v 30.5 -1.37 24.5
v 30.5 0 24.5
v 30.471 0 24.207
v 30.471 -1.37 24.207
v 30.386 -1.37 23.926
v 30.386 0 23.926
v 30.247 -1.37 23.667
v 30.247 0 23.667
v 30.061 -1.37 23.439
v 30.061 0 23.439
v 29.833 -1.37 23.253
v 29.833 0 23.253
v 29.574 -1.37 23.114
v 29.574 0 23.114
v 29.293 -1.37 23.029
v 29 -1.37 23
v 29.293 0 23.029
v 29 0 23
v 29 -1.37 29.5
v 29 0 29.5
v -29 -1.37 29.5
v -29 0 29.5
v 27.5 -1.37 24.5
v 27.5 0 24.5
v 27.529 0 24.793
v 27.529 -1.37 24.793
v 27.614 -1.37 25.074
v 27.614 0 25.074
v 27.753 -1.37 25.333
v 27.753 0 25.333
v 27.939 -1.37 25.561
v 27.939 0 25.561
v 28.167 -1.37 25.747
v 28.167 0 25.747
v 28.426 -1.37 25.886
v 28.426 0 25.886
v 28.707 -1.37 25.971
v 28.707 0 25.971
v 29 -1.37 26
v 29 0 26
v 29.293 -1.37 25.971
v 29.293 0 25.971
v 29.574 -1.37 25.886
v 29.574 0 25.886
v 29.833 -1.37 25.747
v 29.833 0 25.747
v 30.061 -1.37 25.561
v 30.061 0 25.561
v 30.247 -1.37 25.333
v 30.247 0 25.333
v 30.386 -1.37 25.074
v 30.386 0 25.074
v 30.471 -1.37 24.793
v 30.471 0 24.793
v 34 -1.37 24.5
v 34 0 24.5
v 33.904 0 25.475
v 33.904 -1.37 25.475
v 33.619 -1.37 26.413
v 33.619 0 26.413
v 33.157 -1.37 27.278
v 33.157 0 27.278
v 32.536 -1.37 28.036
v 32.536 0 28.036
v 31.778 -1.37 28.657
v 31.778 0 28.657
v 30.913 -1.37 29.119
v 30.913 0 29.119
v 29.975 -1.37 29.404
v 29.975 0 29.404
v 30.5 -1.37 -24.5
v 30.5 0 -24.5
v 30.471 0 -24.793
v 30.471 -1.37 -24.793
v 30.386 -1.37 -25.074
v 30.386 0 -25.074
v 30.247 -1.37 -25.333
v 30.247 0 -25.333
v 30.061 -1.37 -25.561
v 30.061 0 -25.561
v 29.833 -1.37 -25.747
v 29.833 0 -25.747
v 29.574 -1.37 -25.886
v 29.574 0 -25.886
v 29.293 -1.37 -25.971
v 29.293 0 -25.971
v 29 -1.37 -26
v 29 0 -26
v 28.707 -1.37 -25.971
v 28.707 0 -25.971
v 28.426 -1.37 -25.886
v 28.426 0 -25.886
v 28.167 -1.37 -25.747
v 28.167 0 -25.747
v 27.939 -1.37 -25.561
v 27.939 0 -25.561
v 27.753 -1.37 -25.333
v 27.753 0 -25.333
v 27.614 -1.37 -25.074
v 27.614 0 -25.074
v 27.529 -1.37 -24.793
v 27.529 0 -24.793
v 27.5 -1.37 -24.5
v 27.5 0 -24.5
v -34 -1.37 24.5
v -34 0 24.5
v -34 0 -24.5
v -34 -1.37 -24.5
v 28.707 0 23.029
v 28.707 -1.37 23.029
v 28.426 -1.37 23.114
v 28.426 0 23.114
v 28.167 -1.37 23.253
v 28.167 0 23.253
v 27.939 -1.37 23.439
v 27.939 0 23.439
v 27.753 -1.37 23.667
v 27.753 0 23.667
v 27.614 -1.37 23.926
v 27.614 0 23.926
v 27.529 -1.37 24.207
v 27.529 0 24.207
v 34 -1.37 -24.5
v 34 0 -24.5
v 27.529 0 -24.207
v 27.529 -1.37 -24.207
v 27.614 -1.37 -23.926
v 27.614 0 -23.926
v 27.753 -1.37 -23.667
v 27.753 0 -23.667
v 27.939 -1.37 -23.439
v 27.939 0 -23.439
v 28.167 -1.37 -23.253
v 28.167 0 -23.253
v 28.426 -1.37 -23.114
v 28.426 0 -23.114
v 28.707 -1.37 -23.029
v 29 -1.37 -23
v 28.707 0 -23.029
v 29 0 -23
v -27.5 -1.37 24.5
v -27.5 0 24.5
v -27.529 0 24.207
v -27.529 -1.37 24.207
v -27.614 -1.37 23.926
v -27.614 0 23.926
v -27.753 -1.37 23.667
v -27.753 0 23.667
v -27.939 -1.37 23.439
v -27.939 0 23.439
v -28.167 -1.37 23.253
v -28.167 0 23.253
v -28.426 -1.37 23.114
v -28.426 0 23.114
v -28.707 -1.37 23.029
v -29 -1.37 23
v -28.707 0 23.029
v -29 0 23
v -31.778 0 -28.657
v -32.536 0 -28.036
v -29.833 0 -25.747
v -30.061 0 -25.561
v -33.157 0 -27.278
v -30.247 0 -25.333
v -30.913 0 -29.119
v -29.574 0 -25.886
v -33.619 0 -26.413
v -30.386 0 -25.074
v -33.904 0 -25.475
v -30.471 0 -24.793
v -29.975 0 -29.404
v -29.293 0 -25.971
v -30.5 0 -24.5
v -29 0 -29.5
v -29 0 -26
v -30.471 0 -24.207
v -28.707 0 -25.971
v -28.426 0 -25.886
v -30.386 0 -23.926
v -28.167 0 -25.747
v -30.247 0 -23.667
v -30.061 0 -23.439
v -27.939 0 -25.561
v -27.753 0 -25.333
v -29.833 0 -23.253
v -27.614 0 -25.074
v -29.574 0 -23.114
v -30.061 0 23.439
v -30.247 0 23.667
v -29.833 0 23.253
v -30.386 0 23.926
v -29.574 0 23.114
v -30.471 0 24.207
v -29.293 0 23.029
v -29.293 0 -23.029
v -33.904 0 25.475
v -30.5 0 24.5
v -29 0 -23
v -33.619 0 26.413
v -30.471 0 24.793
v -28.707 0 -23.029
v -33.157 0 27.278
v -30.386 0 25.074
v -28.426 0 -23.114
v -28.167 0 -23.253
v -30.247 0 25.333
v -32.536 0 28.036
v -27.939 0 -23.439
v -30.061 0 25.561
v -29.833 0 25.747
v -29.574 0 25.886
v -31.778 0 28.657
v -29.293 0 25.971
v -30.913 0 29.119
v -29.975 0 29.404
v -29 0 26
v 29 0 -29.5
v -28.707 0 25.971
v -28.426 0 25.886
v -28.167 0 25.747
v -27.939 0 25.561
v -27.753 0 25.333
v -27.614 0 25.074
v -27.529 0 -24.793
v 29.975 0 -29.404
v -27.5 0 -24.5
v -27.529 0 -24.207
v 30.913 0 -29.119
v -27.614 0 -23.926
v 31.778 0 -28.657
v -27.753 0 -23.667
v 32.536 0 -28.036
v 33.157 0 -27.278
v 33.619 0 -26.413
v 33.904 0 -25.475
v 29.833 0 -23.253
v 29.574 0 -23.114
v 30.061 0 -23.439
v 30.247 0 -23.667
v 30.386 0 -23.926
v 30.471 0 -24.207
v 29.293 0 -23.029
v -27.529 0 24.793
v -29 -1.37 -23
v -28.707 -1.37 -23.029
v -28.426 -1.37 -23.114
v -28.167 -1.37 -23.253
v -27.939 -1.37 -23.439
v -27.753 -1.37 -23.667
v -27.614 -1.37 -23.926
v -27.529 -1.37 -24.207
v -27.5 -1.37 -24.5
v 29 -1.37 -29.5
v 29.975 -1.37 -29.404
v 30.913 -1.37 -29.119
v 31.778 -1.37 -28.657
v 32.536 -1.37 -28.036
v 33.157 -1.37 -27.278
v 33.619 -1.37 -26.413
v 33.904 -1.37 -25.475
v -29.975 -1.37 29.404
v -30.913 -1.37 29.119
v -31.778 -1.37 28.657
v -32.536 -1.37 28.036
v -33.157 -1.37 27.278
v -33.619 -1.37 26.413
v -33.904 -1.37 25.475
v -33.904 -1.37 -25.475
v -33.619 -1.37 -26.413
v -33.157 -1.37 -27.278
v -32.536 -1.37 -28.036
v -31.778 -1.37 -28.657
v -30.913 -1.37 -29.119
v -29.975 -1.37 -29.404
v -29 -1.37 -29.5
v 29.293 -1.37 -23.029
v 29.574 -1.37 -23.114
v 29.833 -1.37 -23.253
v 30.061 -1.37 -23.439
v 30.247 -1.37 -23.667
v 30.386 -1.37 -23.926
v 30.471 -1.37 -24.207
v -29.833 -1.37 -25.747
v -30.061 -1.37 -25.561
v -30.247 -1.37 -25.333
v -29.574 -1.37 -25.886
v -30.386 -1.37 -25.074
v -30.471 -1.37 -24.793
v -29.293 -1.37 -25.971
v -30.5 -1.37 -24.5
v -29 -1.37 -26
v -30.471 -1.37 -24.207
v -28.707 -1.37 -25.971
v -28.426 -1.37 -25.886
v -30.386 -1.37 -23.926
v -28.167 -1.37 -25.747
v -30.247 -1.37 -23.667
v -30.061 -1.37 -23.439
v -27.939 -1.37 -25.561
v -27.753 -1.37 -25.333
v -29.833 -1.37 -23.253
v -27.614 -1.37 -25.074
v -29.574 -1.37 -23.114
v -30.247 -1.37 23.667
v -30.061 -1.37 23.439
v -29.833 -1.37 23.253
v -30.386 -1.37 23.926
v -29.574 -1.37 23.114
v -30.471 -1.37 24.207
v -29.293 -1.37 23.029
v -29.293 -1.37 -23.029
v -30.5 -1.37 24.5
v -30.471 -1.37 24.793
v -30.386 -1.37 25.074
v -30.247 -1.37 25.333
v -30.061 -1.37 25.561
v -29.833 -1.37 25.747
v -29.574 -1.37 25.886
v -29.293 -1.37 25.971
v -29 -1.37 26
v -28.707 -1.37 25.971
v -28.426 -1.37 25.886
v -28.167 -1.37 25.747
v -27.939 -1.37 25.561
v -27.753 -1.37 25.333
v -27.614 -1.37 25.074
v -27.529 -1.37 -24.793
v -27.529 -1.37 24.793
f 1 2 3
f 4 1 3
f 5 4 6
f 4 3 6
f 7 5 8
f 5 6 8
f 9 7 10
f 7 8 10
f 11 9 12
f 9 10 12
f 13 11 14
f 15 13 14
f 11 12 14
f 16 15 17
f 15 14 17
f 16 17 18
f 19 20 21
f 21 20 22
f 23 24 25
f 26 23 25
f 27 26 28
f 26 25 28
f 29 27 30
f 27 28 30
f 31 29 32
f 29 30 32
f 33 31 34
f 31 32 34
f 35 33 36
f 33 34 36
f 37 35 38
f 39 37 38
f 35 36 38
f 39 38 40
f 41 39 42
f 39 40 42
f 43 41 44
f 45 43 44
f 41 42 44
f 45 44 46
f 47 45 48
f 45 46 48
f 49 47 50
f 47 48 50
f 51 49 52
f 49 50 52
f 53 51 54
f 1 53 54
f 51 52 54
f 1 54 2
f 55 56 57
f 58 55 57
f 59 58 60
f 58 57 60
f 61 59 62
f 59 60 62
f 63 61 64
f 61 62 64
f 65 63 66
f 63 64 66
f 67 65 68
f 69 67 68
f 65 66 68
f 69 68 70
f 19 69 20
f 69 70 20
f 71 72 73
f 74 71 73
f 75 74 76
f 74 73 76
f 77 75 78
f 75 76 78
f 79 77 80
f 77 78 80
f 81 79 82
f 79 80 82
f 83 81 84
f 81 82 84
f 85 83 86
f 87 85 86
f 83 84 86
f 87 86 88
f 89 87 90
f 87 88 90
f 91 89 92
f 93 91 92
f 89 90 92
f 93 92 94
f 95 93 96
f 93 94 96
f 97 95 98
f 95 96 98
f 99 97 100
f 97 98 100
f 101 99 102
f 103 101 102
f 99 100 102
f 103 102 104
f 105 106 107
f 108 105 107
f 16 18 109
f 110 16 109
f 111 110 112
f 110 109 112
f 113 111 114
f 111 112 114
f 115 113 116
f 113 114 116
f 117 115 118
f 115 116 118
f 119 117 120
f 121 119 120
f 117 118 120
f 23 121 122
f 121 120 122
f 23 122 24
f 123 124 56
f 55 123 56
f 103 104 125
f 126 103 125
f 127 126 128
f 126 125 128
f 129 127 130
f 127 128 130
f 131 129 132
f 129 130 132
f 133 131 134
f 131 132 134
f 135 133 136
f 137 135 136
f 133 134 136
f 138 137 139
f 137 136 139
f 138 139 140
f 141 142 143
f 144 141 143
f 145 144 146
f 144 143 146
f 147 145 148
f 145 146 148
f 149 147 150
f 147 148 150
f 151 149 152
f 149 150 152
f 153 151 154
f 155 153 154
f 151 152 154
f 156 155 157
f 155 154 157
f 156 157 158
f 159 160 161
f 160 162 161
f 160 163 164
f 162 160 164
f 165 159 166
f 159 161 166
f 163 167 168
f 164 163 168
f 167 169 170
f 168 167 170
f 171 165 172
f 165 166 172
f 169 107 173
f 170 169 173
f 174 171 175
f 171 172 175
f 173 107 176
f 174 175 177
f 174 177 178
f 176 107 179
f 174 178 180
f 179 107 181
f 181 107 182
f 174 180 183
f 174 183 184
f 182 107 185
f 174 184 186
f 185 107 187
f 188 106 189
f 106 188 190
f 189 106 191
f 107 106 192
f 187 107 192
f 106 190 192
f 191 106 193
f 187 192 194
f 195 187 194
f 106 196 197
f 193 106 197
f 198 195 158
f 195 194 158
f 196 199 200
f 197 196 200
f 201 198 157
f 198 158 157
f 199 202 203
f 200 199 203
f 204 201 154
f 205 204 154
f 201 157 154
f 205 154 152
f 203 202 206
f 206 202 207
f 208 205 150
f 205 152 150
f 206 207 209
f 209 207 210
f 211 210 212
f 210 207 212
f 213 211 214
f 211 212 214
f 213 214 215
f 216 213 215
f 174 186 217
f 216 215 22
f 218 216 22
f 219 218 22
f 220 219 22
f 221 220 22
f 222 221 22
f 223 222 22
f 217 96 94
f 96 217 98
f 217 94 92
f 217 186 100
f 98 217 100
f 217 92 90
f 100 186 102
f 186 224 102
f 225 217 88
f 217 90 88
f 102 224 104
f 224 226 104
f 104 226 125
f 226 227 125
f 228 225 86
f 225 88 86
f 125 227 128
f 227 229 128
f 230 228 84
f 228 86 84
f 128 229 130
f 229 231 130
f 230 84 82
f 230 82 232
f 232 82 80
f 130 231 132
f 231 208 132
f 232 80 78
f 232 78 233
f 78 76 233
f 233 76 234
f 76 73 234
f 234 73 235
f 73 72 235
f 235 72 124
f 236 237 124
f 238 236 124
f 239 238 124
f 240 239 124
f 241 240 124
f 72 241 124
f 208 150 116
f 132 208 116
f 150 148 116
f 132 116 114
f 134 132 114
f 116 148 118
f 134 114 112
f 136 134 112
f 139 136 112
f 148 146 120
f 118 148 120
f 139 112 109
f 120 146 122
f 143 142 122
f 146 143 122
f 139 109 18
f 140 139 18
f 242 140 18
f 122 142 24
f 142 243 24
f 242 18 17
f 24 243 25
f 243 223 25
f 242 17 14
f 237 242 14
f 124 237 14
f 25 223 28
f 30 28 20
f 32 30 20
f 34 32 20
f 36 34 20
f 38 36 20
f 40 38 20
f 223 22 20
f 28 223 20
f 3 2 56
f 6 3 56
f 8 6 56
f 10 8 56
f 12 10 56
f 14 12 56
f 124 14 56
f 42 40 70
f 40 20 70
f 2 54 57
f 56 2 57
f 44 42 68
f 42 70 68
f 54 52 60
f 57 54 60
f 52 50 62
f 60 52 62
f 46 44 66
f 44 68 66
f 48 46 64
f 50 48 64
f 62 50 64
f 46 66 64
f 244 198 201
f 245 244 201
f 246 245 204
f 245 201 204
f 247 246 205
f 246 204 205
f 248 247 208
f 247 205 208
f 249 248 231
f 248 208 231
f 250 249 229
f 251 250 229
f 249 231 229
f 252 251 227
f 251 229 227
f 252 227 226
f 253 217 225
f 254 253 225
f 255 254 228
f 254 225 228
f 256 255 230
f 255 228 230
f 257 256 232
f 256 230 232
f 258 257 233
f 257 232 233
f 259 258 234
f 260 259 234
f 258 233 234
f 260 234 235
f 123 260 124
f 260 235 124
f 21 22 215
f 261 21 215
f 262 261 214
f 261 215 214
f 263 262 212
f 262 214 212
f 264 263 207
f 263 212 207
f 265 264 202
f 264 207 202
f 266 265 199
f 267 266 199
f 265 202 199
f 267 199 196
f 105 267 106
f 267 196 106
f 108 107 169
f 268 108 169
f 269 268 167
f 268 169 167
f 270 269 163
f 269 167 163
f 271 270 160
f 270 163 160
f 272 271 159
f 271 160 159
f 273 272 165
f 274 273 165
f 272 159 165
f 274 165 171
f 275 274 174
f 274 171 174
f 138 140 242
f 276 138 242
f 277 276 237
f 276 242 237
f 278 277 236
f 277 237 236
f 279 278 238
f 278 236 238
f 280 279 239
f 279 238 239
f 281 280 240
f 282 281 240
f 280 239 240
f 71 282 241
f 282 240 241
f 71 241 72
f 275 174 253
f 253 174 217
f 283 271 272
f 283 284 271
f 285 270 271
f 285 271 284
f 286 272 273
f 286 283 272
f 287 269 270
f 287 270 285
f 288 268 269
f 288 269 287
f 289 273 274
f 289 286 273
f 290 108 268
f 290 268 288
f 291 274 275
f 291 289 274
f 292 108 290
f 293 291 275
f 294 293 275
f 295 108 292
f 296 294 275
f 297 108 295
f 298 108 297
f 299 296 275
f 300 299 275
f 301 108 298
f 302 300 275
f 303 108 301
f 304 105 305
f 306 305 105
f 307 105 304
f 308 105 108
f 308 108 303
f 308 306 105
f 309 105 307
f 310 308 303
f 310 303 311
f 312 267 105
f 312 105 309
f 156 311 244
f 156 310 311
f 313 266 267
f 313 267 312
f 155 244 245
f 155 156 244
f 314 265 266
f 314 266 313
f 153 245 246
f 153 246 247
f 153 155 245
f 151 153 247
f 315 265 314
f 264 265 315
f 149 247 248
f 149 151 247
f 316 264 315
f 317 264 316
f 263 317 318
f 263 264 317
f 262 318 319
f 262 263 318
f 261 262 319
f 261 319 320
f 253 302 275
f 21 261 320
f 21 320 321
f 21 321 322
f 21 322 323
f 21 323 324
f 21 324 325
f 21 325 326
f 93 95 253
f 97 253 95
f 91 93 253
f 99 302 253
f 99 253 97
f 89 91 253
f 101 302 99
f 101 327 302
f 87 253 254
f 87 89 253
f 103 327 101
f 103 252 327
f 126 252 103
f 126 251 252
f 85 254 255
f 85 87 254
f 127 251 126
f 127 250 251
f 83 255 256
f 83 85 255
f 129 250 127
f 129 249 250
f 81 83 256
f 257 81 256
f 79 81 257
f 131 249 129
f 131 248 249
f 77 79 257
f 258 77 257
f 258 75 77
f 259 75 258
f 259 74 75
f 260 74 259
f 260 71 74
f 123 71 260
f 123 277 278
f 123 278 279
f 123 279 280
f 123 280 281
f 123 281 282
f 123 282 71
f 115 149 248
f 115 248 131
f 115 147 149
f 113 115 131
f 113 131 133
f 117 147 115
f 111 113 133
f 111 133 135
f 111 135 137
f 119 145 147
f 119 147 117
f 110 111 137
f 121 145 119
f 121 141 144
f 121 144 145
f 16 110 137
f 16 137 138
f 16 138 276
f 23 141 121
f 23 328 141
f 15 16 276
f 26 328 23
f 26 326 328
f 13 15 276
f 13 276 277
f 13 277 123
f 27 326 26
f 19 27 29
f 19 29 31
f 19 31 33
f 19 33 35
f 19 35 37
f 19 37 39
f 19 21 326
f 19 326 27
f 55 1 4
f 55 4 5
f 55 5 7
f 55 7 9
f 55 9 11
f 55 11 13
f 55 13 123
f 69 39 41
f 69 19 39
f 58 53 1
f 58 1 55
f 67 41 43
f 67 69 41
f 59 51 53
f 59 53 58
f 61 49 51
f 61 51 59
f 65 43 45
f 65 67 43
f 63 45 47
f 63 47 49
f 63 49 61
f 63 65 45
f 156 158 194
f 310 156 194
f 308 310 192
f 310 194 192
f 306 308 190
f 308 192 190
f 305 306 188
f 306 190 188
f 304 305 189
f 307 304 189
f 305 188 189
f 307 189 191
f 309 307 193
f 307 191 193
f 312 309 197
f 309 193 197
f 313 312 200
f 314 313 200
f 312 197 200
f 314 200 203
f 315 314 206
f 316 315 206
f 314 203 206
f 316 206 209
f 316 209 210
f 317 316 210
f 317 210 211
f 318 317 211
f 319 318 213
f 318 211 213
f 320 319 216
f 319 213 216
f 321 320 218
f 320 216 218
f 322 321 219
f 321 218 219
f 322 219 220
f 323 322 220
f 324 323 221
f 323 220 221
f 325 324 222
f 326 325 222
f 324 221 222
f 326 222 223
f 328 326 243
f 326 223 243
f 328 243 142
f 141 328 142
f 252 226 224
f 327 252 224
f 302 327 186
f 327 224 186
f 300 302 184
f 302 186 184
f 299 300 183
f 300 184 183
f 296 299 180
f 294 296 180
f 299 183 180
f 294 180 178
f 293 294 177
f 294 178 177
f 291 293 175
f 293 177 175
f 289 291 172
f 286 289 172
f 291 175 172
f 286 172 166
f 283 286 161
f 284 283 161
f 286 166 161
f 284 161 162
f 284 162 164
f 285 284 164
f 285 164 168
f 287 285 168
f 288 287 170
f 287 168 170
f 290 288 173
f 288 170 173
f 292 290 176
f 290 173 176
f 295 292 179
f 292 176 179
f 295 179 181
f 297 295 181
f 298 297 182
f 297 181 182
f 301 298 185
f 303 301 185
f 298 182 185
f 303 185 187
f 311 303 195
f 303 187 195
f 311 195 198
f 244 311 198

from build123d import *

# Parameters (mm, degrees)
F1_DEPTH = 1.37


with BuildPart() as f1:
    # F0 (on Front) → F1 (new body)
    with BuildSketch(Plane.XZ):
        with BuildLine():
            Line((29, 29.5), (-29, 29.5))
            ThreePointArc((-29, 29.5), (-32.5355339059, 28.0355339059), (-34, 24.5))
            Line((-34, 24.5), (-34, -24.5))
            ThreePointArc((-34, -24.5), (-32.5355339059, -28.0355339059), (-29, -29.5))
            Line((-29, -29.5), (29, -29.5))
            ThreePointArc((29, -29.5), (32.5355339059, -28.0355339059), (34, -24.5))
            Line((34, -24.5), (34, 24.5))
            ThreePointArc((34, 24.5), (32.5355339059, 28.0355339059), (29, 29.5))
        make_face()
        with BuildLine():
            ThreePointArc((-29, 23), (-30.0606601718, 25.5606601718), (-27.5, 24.5))
            Line((-27.5, 24.5), (27.5, 24.5))
            ThreePointArc((27.5, 24.5), (29, 26), (30.5, 24.5))
            ThreePointArc((30.5, 24.5), (30.0606601718, 23.4393398282), (29, 23))
            Line((29, 23), (29, -23))
            ThreePointArc((29, -23), (30.0606601718, -23.4393398282), (30.5, -24.5))
            ThreePointArc((30.5, -24.5), (29, -26), (27.5, -24.5))
            Line((27.5, -24.5), (-27.5, -24.5))
            ThreePointArc((-27.5, -24.5), (-30.0606601718, -25.5606601718), (-29, -23))
            Line((-29, -23), (-29, 23))
        make_face(mode=Mode.SUBTRACT)
        with BuildLine():
            Line((27.5, 24.5), (-27.5, 24.5))
            ThreePointArc((-27.5, 24.5), (-27.9393398282, 23.4393398282), (-29, 23))
            Line((-29, 23), (-29, -23))
            ThreePointArc((-29, -23), (-27.9393398282, -23.4393398282), (-27.5, -24.5))
            Line((-27.5, -24.5), (27.5, -24.5))
            ThreePointArc((27.5, -24.5), (27.9393398282, -23.4393398282), (29, -23))
            Line((29, -23), (29, 23))
            ThreePointArc((29, 23), (27.9393398282, 23.4393398282), (27.5, 24.5))
        make_face()
    extrude(amount=F1_DEPTH)


solid = f1.part
